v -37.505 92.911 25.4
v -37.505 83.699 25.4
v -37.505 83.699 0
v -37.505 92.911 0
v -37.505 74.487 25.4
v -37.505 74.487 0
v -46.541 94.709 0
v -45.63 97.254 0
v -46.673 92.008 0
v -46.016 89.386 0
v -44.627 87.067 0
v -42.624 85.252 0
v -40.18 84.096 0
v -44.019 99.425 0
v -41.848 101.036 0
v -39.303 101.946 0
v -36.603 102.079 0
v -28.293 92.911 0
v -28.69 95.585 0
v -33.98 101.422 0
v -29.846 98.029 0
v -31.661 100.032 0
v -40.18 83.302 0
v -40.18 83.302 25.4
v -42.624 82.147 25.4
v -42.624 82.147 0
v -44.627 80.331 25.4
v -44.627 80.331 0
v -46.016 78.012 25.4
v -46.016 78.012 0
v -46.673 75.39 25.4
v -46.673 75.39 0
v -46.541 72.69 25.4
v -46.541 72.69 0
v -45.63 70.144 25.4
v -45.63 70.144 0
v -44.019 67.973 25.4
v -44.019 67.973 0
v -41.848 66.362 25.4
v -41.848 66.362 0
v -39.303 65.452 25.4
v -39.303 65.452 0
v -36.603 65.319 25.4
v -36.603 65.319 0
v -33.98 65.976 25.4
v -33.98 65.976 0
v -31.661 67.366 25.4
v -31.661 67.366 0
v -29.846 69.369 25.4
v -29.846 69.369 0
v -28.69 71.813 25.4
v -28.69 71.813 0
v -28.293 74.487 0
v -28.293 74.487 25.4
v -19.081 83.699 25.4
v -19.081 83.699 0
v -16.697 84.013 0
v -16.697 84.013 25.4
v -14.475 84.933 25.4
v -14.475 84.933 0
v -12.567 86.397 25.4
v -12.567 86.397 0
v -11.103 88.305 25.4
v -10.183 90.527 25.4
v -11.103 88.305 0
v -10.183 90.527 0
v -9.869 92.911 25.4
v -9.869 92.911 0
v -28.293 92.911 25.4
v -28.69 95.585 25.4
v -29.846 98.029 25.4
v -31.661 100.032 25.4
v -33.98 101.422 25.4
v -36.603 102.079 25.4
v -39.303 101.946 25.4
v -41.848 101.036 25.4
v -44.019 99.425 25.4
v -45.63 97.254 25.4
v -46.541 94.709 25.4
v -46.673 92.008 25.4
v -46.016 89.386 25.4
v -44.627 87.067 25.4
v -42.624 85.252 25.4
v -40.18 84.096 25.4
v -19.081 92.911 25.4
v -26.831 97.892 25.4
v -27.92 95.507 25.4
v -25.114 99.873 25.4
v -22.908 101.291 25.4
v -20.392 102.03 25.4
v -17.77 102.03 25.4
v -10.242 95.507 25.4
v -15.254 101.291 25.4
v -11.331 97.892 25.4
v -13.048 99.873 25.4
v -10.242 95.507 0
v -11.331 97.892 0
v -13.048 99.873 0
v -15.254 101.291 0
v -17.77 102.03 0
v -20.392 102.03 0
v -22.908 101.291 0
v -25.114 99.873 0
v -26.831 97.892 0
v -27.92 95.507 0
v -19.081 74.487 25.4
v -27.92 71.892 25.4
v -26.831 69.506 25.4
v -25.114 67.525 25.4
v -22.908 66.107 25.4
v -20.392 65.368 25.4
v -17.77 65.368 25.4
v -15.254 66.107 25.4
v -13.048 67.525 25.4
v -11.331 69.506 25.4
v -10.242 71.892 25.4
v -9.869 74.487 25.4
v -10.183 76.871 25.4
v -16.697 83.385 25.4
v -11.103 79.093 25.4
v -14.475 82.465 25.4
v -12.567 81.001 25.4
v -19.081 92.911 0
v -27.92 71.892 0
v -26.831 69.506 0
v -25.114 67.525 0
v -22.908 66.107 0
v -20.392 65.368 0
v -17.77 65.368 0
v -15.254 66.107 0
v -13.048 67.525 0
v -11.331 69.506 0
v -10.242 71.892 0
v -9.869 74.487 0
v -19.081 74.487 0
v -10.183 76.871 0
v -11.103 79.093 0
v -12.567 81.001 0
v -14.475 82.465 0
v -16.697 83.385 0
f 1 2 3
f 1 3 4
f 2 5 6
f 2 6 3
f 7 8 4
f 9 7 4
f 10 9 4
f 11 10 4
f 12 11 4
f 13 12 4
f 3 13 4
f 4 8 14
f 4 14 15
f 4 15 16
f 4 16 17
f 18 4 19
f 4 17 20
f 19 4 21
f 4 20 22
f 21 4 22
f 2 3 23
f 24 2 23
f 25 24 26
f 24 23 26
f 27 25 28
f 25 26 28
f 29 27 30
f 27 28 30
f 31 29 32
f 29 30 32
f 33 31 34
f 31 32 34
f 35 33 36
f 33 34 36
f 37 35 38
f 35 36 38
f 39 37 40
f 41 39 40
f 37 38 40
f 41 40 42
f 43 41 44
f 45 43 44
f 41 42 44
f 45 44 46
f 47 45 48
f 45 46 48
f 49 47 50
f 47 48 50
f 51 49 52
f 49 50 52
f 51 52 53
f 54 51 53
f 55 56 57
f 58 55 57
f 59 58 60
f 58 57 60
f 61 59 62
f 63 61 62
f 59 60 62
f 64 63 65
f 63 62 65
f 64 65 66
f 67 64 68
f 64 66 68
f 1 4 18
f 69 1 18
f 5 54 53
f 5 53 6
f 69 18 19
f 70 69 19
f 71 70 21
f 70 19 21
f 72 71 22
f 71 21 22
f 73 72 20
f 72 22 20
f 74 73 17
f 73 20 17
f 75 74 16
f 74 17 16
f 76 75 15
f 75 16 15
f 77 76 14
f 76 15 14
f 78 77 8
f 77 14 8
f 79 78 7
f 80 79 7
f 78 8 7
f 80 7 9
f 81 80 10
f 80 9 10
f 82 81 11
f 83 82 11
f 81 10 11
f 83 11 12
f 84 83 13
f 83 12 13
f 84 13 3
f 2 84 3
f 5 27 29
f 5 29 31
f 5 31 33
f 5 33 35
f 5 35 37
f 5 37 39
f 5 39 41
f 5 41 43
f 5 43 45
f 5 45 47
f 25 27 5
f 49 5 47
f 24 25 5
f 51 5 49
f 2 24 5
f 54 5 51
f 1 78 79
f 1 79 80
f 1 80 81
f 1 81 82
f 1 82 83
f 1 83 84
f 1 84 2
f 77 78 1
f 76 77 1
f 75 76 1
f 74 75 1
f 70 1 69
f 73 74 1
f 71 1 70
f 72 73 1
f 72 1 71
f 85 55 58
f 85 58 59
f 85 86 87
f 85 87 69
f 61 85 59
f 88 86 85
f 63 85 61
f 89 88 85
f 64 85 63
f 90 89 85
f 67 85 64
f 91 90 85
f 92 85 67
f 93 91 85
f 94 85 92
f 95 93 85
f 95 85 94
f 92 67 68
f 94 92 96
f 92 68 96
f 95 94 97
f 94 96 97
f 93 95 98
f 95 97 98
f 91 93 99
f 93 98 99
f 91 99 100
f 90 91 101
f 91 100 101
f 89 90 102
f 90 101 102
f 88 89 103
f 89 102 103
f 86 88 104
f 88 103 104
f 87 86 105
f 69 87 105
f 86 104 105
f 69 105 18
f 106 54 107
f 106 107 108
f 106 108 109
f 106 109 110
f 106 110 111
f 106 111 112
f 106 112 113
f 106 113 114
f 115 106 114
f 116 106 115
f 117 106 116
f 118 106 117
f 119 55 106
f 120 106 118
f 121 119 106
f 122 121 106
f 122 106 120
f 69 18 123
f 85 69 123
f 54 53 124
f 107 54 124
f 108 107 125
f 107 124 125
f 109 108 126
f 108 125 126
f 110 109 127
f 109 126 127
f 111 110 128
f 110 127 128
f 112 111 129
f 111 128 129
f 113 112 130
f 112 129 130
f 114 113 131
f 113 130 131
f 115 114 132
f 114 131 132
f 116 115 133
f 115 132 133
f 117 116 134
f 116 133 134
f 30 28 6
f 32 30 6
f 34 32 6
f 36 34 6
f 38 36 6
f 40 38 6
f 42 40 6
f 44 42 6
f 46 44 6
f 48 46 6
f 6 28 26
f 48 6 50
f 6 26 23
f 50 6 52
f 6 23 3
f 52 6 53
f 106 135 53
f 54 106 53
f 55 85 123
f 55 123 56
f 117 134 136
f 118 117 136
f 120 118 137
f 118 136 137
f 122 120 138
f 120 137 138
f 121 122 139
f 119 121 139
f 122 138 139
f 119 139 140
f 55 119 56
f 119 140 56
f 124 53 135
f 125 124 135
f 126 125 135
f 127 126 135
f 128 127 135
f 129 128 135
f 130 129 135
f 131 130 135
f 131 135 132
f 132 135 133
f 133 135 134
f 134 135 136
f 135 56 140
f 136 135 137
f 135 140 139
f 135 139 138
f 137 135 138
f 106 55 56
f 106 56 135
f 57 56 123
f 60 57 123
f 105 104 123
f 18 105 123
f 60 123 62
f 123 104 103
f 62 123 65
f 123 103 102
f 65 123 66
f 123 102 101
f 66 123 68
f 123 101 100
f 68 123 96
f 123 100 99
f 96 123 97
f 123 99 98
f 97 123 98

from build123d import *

# Parameters (mm, degrees)
F1_DEPTH = 25.4


with BuildPart() as f1:
    # F0 (on Top) → F1 (new body)
    with BuildSketch(Plane.XY):
        with BuildLine():
            ThreePointArc((-28.293273, 92.911288), (-44.01949, 99.4253), (-37.505478, 83.699084))
            Line((-37.505478, 83.699084), (-37.505478, 92.911288))
            Line((-37.505478, 92.911288), (-28.293273, 92.911288))
        make_face()
        with BuildLine():
            Line((-19.081069, 92.911288), (-19.081069, 83.699084))
            ThreePointArc((-19.081069, 83.699084), (-12.567056, 86.397276), (-9.868864, 92.911288))
            ThreePointArc((-9.868864, 92.911288), (-19.081069, 102.123493), (-28.293273, 92.911288))
            Line((-28.293273, 92.911288), (-19.081069, 92.911288))
        make_face()
        with BuildLine():
            Line((-19.081069, 74.486879), (-28.293273, 74.486879))
            ThreePointArc((-28.293273, 74.486879), (-19.081069, 65.274675), (-9.868864, 74.486879))
            ThreePointArc((-9.868864, 74.486879), (-12.567056, 81.000891), (-19.081069, 83.699084))
            Line((-19.081069, 83.699084), (-19.081069, 74.486879))
        make_face()
        with BuildLine():
            Line((-28.293273, 74.486879), (-37.505478, 74.486879))
            Line((-37.505478, 74.486879), (-37.505478, 83.699084))
            ThreePointArc((-37.505478, 83.699084), (-44.01949, 67.972867), (-28.293273, 74.486879))
        make_face()
    extrude(amount=F1_DEPTH)


solid = f1.part
